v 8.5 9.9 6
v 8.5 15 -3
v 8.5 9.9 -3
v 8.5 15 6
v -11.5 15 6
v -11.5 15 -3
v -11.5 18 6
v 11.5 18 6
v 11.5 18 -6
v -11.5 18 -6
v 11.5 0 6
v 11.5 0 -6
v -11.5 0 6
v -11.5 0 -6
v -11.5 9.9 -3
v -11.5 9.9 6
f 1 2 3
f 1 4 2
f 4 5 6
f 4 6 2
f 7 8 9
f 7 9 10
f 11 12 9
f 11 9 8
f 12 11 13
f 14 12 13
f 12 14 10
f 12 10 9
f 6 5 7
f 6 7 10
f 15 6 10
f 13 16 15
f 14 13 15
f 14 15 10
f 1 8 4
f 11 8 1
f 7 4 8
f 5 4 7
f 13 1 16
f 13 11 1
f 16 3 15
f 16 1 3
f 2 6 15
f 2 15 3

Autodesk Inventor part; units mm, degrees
ref_plane "YZ Plane" through (0, 0, 0) normal (1, 0, 0) x (0, 1, 0)
ref_plane "XZ Plane" through (0, 0, 0) normal (0, 1, 0) x (-1, 0, 0)
ref_plane "XY Plane" through (0, 0, 0) normal (0, 0, 1) x (1, 0, 0)
sketch "base" plane through (0, 0, 0) normal (0, 1, 0) x (-1, 0, 0)
  line L0 (-11.5, 6) -> (11.5, 6)
  line L1 (11.5, 6) -> (11.5, -6)
  line L2 (11.5, -6) -> (-11.5, -6)
  line L3 (-11.5, -6) -> (-11.5, 6)
  line L4 (-11.5, 6) -> (11.5, -6) construction
  line L5 (11.5, 6) -> (-11.5, -6) construction
  point P0 (0, 0)
  dimension "d0" = 23
  dimension "d1" = 12
extrude "Extrusion1" add sketch "base" along normal blind 18
sketch "Sketch3" plane through (-11.5, 0, 6) normal (0, 0, 1) x (1, 0, 0)
  line L0 (20, 9.9) -> (0, 9.9)
  line L1 (0, 9.9) -> (0, 15)
  line L2 (0, 15) -> (20, 15)
  line L3 (20, 15) -> (20, 9.9)
  line L4 (0, 0) -> (0, 18) projected
  line L5 (0, 18) -> (23, 18) projected
  line L6 (23, 0) -> (23, 18) projected
  point P0 (11.5, 0)
  dimension "d9" = 5.1
  dimension "d10" = 3
  dimension "d11" = 3
extrude "Extrusion3" cut sketch "Sketch3" against normal blind 9
equation "\"d11\" = d10"
properties part number "peg_TR"
